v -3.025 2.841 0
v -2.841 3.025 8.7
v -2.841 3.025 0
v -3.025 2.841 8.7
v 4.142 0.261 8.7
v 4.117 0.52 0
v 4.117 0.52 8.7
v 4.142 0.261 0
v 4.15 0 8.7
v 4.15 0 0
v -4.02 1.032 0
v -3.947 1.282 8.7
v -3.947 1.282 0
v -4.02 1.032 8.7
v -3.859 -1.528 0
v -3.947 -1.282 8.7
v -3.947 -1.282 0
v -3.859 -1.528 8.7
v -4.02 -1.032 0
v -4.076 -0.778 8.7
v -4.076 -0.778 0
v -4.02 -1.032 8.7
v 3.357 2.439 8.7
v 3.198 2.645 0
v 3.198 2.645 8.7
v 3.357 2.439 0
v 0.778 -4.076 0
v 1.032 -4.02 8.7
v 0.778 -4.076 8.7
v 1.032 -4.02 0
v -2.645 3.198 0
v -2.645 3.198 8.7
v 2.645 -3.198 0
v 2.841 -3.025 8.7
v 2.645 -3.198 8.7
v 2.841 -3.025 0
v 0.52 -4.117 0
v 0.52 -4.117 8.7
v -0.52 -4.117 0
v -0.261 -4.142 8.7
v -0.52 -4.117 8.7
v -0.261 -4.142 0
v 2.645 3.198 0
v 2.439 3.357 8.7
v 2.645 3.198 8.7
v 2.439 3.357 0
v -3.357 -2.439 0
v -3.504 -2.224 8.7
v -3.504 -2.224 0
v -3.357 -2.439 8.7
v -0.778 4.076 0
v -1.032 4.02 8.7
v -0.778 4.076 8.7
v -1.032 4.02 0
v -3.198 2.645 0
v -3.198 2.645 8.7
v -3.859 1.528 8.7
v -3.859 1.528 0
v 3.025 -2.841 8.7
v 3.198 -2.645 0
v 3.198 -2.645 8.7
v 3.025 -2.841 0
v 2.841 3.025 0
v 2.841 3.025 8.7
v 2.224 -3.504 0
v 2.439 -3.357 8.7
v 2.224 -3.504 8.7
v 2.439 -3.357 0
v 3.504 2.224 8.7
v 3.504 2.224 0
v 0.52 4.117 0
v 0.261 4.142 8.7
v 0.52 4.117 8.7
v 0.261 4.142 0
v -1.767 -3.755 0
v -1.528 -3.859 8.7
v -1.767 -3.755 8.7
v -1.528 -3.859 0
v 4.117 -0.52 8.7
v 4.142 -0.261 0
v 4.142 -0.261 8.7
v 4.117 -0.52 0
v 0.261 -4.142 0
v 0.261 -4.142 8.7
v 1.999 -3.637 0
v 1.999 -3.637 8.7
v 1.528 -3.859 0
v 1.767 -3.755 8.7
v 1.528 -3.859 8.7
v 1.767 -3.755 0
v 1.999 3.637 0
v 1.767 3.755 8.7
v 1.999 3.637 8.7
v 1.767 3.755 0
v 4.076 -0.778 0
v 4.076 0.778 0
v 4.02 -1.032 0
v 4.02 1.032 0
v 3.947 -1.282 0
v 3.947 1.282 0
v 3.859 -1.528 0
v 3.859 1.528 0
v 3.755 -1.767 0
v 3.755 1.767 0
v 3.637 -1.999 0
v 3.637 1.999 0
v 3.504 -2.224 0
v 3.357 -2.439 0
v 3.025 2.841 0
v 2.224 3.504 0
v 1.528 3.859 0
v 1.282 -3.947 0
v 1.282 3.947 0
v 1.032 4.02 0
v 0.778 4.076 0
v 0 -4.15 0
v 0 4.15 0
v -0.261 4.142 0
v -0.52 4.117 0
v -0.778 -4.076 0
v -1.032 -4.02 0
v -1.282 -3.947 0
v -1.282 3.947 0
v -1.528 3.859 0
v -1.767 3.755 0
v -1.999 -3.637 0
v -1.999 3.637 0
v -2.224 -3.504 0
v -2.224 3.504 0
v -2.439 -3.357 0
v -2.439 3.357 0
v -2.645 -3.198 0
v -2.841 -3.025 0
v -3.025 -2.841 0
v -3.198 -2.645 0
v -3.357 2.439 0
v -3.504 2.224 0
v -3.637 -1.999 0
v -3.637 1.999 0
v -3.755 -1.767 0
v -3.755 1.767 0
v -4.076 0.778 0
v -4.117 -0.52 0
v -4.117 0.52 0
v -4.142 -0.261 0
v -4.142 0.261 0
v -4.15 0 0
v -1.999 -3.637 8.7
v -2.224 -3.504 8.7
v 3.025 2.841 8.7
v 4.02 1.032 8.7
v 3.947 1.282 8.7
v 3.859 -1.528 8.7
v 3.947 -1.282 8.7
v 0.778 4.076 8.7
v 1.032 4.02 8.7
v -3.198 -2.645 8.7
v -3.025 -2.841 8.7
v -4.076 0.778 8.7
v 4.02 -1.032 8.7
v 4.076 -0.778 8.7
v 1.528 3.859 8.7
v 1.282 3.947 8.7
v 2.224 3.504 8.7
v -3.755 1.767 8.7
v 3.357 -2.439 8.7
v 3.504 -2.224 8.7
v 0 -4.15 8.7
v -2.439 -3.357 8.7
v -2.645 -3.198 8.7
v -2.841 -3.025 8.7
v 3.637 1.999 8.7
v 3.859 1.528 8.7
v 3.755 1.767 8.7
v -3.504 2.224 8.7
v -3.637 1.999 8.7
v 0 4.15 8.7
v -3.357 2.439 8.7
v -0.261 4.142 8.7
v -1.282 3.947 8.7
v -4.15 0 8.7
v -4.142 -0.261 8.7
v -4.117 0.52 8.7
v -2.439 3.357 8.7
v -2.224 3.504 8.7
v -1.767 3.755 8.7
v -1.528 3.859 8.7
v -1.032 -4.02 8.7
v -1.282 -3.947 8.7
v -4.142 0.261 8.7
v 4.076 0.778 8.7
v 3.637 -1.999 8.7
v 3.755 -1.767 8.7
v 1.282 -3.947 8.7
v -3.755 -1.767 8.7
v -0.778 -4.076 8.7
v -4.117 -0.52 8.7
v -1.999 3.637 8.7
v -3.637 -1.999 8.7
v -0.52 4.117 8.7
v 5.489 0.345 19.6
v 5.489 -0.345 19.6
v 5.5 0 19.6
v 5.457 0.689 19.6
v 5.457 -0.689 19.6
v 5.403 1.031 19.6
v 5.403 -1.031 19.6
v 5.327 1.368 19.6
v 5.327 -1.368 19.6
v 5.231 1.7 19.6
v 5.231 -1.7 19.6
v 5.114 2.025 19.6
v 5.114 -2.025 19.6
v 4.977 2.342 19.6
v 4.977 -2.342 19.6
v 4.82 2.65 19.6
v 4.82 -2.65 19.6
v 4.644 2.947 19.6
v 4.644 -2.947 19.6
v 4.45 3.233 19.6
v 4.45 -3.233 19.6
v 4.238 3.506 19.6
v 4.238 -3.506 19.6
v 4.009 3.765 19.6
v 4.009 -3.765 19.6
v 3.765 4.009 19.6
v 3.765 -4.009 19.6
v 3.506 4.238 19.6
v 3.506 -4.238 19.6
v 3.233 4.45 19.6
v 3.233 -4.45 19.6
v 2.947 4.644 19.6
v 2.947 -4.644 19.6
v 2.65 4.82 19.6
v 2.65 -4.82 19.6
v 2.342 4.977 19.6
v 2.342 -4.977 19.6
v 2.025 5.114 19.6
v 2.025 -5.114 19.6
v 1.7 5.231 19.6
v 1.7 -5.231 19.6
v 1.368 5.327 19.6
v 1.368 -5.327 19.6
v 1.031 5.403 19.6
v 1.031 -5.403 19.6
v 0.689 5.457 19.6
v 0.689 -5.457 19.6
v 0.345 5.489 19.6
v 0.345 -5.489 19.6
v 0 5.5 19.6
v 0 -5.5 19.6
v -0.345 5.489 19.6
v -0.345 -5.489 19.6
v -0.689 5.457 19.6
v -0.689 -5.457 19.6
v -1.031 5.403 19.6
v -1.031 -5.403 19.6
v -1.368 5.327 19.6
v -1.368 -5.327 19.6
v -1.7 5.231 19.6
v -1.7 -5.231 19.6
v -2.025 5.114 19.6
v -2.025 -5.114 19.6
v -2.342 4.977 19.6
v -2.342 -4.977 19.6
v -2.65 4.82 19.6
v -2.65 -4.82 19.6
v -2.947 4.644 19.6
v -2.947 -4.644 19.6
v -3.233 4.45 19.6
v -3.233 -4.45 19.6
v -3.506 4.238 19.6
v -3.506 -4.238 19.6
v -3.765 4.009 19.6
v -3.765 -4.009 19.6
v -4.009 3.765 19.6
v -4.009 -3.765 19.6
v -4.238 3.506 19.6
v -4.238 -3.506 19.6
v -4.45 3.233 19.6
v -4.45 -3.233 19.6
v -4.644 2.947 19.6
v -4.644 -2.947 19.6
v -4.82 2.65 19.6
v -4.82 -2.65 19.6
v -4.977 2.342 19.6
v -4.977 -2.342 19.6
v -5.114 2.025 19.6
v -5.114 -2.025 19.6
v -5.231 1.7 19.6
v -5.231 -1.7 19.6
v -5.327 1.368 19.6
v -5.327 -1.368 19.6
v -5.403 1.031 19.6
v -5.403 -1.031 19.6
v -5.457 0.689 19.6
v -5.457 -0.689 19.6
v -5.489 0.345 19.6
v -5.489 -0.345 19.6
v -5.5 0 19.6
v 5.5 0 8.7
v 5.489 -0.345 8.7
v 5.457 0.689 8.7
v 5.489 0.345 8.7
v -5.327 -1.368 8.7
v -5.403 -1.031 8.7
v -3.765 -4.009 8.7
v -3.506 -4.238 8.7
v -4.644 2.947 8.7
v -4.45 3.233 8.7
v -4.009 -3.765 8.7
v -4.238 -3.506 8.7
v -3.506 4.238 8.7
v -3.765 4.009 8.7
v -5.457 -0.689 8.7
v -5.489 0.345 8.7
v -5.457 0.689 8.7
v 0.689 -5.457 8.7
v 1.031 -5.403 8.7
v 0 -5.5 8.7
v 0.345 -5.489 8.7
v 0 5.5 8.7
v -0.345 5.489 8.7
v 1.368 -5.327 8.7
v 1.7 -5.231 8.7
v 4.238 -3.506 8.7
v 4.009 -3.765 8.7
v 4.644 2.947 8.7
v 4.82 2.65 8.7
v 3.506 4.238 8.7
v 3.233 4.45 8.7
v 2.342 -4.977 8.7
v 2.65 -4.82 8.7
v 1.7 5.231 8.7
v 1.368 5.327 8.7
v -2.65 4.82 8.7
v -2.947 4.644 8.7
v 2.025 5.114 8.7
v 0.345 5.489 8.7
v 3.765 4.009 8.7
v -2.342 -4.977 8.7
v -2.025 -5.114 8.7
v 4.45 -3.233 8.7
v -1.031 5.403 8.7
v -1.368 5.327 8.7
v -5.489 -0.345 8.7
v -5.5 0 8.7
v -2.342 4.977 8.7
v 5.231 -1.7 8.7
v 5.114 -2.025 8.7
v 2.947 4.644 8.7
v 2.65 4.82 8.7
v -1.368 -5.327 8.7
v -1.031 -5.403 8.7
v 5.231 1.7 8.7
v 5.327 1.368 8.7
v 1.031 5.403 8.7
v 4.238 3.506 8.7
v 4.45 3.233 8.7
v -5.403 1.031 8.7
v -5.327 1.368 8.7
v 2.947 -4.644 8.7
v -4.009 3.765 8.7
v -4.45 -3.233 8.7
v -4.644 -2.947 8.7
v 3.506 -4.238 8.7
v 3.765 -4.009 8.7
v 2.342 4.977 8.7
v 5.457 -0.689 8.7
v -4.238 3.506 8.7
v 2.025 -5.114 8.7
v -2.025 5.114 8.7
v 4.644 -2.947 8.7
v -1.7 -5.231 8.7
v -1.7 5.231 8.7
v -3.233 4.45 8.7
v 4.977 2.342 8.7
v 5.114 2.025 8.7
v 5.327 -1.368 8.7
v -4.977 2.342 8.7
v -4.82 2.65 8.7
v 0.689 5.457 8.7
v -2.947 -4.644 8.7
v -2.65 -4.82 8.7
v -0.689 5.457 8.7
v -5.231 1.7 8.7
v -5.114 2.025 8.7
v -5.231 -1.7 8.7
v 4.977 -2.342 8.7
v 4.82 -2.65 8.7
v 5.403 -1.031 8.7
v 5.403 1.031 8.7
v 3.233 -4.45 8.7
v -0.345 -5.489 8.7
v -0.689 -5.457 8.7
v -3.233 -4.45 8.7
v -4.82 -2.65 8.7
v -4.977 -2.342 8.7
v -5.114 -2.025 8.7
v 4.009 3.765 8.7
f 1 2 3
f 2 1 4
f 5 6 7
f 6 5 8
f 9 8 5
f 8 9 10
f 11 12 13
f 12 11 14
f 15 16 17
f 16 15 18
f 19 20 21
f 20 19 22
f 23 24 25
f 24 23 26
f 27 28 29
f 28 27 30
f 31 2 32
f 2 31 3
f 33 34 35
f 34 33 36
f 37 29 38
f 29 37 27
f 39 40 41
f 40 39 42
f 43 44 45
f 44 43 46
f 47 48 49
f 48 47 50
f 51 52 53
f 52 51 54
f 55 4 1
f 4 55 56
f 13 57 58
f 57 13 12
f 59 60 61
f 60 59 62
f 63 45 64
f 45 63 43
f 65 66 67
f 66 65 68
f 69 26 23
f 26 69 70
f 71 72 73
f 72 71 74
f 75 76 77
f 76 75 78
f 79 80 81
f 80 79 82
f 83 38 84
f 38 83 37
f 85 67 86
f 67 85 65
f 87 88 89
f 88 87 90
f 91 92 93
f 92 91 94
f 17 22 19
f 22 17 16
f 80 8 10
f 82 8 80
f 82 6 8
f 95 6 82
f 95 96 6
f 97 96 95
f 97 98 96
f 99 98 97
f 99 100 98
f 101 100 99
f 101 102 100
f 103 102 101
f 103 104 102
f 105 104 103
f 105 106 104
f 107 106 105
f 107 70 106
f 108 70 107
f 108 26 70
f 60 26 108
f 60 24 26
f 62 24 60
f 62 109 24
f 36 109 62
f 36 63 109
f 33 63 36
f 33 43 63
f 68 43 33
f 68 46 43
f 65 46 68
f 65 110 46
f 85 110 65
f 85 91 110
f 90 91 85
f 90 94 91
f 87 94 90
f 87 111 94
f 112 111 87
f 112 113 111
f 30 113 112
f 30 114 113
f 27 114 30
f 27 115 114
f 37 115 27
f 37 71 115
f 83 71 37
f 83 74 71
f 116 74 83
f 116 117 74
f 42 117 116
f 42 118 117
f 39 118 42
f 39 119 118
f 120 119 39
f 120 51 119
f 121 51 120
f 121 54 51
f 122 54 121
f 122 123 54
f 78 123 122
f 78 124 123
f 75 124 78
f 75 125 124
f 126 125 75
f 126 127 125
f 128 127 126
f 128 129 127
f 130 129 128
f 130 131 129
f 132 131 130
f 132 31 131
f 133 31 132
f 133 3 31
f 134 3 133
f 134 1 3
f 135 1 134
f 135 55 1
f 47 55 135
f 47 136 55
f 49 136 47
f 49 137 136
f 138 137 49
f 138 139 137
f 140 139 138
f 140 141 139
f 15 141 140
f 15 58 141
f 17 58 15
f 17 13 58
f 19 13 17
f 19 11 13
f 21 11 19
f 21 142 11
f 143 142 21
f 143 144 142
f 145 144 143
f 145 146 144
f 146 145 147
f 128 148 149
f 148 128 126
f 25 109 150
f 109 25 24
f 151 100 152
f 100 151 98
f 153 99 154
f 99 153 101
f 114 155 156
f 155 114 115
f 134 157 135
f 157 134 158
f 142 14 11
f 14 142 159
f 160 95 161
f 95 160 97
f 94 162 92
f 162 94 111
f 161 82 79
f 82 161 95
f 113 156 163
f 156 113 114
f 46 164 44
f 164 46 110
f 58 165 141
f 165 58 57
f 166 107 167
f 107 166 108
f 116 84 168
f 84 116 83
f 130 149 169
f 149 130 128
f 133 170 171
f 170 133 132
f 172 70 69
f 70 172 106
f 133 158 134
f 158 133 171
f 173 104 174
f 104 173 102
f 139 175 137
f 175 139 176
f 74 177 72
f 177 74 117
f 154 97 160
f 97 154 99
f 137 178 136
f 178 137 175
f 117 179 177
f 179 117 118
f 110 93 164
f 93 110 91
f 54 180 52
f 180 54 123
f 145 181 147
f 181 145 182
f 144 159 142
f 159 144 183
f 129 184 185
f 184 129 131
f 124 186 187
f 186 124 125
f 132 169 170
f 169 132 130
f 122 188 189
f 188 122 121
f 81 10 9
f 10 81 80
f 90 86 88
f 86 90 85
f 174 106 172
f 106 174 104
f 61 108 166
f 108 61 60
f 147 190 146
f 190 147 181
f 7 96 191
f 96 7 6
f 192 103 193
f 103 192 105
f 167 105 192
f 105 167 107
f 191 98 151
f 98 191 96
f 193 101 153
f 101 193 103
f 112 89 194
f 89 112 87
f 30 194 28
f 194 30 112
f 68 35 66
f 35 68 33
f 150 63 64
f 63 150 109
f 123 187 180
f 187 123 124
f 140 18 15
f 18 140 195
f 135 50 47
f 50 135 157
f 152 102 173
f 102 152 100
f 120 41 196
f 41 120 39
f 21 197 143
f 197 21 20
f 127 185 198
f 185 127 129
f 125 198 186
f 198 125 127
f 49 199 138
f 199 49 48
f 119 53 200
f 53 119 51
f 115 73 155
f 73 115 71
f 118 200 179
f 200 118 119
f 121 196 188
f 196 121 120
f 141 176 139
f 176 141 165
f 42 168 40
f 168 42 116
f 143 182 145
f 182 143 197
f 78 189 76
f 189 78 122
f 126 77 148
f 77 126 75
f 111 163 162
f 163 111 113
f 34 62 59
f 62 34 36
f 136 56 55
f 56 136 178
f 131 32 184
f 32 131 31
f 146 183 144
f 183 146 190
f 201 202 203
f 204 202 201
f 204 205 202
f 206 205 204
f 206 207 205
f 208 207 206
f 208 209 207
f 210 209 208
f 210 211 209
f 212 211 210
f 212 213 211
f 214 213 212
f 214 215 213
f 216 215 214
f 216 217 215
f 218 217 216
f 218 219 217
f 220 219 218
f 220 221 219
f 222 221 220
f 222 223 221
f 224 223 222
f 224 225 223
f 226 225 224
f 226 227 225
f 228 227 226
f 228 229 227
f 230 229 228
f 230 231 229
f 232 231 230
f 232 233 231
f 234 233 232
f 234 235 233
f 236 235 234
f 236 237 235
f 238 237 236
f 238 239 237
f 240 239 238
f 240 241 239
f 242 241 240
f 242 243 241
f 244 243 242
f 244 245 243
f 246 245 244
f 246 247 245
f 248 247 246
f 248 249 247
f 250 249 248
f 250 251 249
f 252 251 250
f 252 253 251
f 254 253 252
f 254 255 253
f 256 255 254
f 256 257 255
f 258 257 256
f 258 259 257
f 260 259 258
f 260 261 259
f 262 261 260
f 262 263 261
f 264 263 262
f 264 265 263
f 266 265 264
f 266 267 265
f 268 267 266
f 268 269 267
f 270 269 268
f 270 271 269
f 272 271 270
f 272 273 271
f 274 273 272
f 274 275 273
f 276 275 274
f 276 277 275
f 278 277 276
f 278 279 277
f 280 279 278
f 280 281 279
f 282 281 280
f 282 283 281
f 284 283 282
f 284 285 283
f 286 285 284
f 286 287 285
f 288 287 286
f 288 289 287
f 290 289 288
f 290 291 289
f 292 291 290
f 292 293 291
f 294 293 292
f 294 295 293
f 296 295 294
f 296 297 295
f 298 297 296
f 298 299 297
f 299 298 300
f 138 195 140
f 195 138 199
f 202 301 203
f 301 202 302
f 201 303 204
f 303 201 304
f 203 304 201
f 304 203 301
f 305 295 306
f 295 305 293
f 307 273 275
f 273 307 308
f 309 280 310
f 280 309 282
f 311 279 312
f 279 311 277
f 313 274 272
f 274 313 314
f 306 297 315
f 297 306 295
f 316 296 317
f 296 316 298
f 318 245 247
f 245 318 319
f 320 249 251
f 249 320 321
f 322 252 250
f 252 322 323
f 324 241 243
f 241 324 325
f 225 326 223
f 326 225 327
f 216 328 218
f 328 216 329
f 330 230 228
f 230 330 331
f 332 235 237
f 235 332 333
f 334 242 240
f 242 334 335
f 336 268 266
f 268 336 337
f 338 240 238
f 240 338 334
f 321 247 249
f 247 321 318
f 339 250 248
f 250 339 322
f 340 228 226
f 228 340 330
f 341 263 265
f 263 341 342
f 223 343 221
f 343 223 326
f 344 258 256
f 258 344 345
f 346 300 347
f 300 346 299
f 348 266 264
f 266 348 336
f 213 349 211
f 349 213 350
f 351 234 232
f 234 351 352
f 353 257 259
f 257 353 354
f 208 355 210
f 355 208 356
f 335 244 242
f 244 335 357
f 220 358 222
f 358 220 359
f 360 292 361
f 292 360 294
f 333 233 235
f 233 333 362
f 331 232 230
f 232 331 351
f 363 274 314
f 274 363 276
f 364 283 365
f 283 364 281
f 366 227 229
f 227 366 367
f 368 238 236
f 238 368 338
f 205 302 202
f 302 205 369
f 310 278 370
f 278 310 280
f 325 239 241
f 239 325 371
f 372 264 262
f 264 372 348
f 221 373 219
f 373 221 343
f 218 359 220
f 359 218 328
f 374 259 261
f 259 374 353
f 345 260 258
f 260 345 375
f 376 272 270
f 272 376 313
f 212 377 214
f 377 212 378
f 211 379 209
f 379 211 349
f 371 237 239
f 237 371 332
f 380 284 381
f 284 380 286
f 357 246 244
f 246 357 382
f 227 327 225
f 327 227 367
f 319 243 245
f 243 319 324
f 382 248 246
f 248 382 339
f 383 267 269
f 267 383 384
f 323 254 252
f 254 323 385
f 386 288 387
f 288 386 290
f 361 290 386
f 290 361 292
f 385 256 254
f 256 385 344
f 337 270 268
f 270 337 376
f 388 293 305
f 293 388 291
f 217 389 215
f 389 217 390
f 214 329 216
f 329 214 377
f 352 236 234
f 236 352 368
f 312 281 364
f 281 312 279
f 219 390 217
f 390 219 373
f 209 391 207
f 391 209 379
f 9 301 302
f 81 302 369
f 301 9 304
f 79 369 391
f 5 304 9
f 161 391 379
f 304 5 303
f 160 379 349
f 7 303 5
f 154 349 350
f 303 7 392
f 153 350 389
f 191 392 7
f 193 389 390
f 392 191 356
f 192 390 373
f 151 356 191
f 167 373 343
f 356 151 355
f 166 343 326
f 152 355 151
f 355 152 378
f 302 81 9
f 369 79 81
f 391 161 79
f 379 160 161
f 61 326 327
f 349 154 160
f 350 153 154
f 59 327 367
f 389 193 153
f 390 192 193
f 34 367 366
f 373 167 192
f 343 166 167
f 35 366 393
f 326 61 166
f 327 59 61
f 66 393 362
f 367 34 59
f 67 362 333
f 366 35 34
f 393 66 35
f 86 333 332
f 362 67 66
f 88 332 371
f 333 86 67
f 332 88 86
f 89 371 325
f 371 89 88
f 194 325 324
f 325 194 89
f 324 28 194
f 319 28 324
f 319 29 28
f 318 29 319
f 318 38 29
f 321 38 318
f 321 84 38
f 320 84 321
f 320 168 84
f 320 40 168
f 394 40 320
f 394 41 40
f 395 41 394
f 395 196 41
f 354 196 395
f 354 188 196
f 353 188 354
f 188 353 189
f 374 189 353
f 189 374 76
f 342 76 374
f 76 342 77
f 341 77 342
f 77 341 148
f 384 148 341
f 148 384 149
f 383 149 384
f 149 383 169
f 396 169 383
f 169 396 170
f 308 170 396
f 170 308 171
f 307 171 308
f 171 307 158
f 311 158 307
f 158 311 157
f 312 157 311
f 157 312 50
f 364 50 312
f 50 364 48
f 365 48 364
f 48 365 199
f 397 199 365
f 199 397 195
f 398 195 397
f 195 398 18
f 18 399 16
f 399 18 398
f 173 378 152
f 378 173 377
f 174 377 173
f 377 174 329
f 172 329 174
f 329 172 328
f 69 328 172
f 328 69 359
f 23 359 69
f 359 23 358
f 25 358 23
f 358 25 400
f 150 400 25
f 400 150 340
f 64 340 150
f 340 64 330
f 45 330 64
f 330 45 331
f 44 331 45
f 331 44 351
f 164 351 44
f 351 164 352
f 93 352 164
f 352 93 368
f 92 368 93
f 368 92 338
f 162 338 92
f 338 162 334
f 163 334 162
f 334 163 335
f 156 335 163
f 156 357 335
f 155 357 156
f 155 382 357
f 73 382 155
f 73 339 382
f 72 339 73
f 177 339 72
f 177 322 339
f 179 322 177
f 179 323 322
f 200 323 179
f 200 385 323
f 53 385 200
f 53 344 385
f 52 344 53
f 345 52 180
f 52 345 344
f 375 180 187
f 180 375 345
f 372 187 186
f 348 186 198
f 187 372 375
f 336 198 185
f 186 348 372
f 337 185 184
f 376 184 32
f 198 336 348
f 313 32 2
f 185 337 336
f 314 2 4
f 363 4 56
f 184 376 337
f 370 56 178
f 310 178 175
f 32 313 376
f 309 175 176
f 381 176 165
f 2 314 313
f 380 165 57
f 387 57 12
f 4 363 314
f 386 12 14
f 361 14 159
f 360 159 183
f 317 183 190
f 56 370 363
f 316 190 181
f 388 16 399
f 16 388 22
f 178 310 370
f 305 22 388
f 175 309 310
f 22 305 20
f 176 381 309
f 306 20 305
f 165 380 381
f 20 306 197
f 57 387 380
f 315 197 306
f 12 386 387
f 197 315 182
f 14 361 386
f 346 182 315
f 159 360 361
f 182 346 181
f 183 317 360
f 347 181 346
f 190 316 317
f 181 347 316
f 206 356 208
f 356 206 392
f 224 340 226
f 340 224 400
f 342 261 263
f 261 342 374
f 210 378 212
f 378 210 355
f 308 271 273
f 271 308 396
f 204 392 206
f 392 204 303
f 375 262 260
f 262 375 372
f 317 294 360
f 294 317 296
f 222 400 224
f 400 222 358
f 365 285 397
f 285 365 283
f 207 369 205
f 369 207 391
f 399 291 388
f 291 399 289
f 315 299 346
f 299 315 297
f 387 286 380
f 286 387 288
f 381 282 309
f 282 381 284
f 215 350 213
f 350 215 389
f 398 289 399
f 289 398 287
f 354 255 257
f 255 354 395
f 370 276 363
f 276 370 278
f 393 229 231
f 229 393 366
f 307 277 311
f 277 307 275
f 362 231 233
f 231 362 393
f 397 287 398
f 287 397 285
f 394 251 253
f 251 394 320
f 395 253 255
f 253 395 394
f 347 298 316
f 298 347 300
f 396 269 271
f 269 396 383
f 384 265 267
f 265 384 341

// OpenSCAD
$fn = 100;
cylinder(19.6,d=8.3);
translate([0,0,8.7])
cylinder(19.6-8.7,d=11);
